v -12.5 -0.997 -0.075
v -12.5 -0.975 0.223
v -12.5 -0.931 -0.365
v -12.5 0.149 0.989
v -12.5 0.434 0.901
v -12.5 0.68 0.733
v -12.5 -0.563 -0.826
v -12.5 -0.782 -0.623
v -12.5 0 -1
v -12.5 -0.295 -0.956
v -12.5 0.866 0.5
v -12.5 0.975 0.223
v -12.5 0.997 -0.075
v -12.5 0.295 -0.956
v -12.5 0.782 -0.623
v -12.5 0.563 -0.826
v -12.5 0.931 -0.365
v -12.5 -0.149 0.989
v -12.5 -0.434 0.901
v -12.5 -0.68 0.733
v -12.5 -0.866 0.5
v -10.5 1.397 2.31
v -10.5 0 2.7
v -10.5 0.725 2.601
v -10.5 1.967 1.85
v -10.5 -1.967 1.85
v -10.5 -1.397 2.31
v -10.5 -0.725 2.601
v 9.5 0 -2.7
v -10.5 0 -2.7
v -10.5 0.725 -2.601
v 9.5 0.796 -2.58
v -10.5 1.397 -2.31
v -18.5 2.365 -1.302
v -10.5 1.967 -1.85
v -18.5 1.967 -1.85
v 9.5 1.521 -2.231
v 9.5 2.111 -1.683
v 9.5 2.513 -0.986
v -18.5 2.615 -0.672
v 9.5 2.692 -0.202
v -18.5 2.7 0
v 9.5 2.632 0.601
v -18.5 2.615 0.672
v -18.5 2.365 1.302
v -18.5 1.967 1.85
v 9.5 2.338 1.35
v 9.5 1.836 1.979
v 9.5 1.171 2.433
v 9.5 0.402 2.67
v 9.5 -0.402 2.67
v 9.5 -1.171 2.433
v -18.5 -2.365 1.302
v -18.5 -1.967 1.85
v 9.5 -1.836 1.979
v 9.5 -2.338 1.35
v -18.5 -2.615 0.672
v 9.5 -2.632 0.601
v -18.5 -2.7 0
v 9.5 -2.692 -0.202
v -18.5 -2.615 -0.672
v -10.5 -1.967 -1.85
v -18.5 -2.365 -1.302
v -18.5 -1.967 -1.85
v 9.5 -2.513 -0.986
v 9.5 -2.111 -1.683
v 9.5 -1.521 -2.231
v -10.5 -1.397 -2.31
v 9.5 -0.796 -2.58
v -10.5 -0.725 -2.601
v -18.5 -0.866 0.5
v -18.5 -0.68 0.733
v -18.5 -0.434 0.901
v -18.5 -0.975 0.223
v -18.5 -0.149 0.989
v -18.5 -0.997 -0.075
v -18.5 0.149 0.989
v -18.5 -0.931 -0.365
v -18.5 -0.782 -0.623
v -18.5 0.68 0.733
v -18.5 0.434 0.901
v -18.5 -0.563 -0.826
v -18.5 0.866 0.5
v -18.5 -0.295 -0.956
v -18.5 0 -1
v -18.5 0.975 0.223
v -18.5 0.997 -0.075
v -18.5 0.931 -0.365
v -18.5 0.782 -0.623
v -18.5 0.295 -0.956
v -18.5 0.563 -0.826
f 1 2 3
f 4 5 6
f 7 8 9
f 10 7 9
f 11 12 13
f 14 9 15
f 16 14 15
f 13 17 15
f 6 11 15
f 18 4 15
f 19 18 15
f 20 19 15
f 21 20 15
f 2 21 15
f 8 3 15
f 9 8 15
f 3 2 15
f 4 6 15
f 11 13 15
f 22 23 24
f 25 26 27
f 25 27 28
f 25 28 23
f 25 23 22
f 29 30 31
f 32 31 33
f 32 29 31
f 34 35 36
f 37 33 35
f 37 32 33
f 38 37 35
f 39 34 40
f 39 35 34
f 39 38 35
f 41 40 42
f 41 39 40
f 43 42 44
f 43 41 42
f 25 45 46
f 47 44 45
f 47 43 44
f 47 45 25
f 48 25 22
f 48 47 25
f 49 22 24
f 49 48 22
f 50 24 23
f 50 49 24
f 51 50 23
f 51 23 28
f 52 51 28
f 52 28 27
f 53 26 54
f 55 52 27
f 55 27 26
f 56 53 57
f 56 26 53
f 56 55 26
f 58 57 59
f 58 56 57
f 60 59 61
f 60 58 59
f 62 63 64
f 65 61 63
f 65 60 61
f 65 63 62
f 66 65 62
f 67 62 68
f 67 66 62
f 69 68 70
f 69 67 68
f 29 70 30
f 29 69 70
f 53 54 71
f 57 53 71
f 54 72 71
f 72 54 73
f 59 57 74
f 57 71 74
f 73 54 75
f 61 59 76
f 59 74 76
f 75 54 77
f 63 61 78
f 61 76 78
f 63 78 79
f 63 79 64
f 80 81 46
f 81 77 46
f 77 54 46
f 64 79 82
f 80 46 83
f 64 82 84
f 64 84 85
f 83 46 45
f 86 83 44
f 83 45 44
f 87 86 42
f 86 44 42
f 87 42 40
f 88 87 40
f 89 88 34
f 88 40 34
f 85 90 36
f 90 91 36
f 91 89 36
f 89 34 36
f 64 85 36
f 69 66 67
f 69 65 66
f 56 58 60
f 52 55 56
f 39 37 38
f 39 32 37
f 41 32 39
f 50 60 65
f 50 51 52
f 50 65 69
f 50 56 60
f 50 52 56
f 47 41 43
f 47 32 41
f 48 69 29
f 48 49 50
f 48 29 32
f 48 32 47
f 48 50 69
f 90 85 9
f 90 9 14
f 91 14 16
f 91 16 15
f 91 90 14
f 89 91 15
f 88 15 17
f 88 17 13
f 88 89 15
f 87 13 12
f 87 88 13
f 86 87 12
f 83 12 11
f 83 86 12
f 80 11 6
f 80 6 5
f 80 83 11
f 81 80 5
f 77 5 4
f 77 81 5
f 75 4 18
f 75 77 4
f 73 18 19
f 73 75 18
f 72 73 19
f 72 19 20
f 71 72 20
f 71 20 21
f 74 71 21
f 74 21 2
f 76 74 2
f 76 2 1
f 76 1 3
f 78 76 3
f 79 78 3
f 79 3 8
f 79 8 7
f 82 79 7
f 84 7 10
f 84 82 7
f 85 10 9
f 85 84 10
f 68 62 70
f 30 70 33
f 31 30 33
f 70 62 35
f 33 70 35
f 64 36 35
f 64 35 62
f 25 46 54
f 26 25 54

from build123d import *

# Parameters (mm, degrees)
SKETCH1_R                         = 2.7
BOSS_EXTRUDE1_DEPTH               = 18.5
CUT_EXTRUDE1_DEPTH                = 8
SKETCH3_R                         = 1
CUT_EXTRUDE2_DEPTH                = 6
CORTAR_EXTRUIR1_REACH             = 21.242
CORTAR_EXTRUIR1_DIRECTION_2_REACH = 21.242


with BuildPart() as part:
    # Sketch1 → Boss-Extrude1 (new, symmetric)
    with BuildSketch(Plane(origin=(0, 0, 0), x_dir=(0, 0, -1), z_dir=(1, 0, 0))):
        Circle(SKETCH1_R)
    extrude(amount=BOSS_EXTRUDE1_DEPTH, both=True)

    # Sketch2 → Cut-Extrude1 (cut)
    with BuildSketch(Plane(origin=(18.5, 0, 0), x_dir=(0, 0, -1), z_dir=(1, 0, 0))):
        with BuildLine():
            Line((-1.85, 1.966596044), (-1.85, -1.966596044))
            ThreePointArc((-1.85, -1.966596044), (-2.7, 0), (-1.85, 1.966596044))
        make_face()
        with BuildLine():
            Line((1.85, 1.966596044), (1.85, -1.966596044))
            ThreePointArc((1.85, -1.966596044), (2.7, 0), (1.85, 1.966596044))
        make_face()
    cut_extrude1 = extrude(amount=-CUT_EXTRUDE1_DEPTH, mode=Mode.SUBTRACT)

    # Sketch3 → Cut-Extrude2 (cut)
    with BuildSketch(Plane(origin=(18.5, 0, 0), x_dir=(0, 0, -1), z_dir=(1, 0, 0))):
        Circle(SKETCH3_R)
    cut_extrude2 = extrude(amount=-CUT_EXTRUDE2_DEPTH, mode=Mode.SUBTRACT)

    # Mirror1: Cut-Extrude1, Cut-Extrude2 across plane
    add(cut_extrude1.mirror(Plane(origin=(0, 0, 0), x_dir=(0, 0, 1), z_dir=(1, 0, 0))), mode=Mode.SUBTRACT)
    add(cut_extrude2.mirror(Plane(origin=(0, 0, 0), x_dir=(0, 0, 1), z_dir=(1, 0, 0))), mode=Mode.SUBTRACT)

    # Croquis1 → Cortar-Extruir1 (cut, up to next)
    with BuildSketch(Plane(origin=(0, 0, -1.85), x_dir=(-1, 0, 0), z_dir=(0, 0, -1)), mode=Mode.PRIVATE) as cortar_extruir1_sk1:
        Polygon((-9.5, -2.7), (-9.5, 3.118496514), (-19.119942129, 3.118496514), (-19.119942129, -3.62450436), (-9.5, -3.62450436), align=None)
    cortar_extruir1_tool1 = extrude(cortar_extruir1_sk1.sketch, amount=-CORTAR_EXTRUIR1_REACH, mode=Mode.PRIVATE) & part.part
    add(cortar_extruir1_tool1.solids().sort_by_distance((14.309971, -0.253004, -1.85))[0], mode=Mode.SUBTRACT)

    # Croquis1 → Cortar-Extruir1 direction 2 (cut, up to next)
    with BuildSketch(Plane(origin=(0, 0, -1.85), x_dir=(-1, 0, 0), z_dir=(0, 0, -1)), mode=Mode.PRIVATE) as cortar_extruir1_direction_2_sk1:
        Polygon((-9.5, -2.7), (-9.5, 3.118496514), (-19.119942129, 3.118496514), (-19.119942129, -3.62450436), (-9.5, -3.62450436), align=None)
    cortar_extruir1_direction_2_tool1 = extrude(cortar_extruir1_direction_2_sk1.sketch, amount=CORTAR_EXTRUIR1_DIRECTION_2_REACH, mode=Mode.PRIVATE) & part.part
    add(cortar_extruir1_direction_2_tool1.solids().sort_by_distance((14.309971, -0.253004, -1.85))[0], mode=Mode.SUBTRACT)


solid = part.part
